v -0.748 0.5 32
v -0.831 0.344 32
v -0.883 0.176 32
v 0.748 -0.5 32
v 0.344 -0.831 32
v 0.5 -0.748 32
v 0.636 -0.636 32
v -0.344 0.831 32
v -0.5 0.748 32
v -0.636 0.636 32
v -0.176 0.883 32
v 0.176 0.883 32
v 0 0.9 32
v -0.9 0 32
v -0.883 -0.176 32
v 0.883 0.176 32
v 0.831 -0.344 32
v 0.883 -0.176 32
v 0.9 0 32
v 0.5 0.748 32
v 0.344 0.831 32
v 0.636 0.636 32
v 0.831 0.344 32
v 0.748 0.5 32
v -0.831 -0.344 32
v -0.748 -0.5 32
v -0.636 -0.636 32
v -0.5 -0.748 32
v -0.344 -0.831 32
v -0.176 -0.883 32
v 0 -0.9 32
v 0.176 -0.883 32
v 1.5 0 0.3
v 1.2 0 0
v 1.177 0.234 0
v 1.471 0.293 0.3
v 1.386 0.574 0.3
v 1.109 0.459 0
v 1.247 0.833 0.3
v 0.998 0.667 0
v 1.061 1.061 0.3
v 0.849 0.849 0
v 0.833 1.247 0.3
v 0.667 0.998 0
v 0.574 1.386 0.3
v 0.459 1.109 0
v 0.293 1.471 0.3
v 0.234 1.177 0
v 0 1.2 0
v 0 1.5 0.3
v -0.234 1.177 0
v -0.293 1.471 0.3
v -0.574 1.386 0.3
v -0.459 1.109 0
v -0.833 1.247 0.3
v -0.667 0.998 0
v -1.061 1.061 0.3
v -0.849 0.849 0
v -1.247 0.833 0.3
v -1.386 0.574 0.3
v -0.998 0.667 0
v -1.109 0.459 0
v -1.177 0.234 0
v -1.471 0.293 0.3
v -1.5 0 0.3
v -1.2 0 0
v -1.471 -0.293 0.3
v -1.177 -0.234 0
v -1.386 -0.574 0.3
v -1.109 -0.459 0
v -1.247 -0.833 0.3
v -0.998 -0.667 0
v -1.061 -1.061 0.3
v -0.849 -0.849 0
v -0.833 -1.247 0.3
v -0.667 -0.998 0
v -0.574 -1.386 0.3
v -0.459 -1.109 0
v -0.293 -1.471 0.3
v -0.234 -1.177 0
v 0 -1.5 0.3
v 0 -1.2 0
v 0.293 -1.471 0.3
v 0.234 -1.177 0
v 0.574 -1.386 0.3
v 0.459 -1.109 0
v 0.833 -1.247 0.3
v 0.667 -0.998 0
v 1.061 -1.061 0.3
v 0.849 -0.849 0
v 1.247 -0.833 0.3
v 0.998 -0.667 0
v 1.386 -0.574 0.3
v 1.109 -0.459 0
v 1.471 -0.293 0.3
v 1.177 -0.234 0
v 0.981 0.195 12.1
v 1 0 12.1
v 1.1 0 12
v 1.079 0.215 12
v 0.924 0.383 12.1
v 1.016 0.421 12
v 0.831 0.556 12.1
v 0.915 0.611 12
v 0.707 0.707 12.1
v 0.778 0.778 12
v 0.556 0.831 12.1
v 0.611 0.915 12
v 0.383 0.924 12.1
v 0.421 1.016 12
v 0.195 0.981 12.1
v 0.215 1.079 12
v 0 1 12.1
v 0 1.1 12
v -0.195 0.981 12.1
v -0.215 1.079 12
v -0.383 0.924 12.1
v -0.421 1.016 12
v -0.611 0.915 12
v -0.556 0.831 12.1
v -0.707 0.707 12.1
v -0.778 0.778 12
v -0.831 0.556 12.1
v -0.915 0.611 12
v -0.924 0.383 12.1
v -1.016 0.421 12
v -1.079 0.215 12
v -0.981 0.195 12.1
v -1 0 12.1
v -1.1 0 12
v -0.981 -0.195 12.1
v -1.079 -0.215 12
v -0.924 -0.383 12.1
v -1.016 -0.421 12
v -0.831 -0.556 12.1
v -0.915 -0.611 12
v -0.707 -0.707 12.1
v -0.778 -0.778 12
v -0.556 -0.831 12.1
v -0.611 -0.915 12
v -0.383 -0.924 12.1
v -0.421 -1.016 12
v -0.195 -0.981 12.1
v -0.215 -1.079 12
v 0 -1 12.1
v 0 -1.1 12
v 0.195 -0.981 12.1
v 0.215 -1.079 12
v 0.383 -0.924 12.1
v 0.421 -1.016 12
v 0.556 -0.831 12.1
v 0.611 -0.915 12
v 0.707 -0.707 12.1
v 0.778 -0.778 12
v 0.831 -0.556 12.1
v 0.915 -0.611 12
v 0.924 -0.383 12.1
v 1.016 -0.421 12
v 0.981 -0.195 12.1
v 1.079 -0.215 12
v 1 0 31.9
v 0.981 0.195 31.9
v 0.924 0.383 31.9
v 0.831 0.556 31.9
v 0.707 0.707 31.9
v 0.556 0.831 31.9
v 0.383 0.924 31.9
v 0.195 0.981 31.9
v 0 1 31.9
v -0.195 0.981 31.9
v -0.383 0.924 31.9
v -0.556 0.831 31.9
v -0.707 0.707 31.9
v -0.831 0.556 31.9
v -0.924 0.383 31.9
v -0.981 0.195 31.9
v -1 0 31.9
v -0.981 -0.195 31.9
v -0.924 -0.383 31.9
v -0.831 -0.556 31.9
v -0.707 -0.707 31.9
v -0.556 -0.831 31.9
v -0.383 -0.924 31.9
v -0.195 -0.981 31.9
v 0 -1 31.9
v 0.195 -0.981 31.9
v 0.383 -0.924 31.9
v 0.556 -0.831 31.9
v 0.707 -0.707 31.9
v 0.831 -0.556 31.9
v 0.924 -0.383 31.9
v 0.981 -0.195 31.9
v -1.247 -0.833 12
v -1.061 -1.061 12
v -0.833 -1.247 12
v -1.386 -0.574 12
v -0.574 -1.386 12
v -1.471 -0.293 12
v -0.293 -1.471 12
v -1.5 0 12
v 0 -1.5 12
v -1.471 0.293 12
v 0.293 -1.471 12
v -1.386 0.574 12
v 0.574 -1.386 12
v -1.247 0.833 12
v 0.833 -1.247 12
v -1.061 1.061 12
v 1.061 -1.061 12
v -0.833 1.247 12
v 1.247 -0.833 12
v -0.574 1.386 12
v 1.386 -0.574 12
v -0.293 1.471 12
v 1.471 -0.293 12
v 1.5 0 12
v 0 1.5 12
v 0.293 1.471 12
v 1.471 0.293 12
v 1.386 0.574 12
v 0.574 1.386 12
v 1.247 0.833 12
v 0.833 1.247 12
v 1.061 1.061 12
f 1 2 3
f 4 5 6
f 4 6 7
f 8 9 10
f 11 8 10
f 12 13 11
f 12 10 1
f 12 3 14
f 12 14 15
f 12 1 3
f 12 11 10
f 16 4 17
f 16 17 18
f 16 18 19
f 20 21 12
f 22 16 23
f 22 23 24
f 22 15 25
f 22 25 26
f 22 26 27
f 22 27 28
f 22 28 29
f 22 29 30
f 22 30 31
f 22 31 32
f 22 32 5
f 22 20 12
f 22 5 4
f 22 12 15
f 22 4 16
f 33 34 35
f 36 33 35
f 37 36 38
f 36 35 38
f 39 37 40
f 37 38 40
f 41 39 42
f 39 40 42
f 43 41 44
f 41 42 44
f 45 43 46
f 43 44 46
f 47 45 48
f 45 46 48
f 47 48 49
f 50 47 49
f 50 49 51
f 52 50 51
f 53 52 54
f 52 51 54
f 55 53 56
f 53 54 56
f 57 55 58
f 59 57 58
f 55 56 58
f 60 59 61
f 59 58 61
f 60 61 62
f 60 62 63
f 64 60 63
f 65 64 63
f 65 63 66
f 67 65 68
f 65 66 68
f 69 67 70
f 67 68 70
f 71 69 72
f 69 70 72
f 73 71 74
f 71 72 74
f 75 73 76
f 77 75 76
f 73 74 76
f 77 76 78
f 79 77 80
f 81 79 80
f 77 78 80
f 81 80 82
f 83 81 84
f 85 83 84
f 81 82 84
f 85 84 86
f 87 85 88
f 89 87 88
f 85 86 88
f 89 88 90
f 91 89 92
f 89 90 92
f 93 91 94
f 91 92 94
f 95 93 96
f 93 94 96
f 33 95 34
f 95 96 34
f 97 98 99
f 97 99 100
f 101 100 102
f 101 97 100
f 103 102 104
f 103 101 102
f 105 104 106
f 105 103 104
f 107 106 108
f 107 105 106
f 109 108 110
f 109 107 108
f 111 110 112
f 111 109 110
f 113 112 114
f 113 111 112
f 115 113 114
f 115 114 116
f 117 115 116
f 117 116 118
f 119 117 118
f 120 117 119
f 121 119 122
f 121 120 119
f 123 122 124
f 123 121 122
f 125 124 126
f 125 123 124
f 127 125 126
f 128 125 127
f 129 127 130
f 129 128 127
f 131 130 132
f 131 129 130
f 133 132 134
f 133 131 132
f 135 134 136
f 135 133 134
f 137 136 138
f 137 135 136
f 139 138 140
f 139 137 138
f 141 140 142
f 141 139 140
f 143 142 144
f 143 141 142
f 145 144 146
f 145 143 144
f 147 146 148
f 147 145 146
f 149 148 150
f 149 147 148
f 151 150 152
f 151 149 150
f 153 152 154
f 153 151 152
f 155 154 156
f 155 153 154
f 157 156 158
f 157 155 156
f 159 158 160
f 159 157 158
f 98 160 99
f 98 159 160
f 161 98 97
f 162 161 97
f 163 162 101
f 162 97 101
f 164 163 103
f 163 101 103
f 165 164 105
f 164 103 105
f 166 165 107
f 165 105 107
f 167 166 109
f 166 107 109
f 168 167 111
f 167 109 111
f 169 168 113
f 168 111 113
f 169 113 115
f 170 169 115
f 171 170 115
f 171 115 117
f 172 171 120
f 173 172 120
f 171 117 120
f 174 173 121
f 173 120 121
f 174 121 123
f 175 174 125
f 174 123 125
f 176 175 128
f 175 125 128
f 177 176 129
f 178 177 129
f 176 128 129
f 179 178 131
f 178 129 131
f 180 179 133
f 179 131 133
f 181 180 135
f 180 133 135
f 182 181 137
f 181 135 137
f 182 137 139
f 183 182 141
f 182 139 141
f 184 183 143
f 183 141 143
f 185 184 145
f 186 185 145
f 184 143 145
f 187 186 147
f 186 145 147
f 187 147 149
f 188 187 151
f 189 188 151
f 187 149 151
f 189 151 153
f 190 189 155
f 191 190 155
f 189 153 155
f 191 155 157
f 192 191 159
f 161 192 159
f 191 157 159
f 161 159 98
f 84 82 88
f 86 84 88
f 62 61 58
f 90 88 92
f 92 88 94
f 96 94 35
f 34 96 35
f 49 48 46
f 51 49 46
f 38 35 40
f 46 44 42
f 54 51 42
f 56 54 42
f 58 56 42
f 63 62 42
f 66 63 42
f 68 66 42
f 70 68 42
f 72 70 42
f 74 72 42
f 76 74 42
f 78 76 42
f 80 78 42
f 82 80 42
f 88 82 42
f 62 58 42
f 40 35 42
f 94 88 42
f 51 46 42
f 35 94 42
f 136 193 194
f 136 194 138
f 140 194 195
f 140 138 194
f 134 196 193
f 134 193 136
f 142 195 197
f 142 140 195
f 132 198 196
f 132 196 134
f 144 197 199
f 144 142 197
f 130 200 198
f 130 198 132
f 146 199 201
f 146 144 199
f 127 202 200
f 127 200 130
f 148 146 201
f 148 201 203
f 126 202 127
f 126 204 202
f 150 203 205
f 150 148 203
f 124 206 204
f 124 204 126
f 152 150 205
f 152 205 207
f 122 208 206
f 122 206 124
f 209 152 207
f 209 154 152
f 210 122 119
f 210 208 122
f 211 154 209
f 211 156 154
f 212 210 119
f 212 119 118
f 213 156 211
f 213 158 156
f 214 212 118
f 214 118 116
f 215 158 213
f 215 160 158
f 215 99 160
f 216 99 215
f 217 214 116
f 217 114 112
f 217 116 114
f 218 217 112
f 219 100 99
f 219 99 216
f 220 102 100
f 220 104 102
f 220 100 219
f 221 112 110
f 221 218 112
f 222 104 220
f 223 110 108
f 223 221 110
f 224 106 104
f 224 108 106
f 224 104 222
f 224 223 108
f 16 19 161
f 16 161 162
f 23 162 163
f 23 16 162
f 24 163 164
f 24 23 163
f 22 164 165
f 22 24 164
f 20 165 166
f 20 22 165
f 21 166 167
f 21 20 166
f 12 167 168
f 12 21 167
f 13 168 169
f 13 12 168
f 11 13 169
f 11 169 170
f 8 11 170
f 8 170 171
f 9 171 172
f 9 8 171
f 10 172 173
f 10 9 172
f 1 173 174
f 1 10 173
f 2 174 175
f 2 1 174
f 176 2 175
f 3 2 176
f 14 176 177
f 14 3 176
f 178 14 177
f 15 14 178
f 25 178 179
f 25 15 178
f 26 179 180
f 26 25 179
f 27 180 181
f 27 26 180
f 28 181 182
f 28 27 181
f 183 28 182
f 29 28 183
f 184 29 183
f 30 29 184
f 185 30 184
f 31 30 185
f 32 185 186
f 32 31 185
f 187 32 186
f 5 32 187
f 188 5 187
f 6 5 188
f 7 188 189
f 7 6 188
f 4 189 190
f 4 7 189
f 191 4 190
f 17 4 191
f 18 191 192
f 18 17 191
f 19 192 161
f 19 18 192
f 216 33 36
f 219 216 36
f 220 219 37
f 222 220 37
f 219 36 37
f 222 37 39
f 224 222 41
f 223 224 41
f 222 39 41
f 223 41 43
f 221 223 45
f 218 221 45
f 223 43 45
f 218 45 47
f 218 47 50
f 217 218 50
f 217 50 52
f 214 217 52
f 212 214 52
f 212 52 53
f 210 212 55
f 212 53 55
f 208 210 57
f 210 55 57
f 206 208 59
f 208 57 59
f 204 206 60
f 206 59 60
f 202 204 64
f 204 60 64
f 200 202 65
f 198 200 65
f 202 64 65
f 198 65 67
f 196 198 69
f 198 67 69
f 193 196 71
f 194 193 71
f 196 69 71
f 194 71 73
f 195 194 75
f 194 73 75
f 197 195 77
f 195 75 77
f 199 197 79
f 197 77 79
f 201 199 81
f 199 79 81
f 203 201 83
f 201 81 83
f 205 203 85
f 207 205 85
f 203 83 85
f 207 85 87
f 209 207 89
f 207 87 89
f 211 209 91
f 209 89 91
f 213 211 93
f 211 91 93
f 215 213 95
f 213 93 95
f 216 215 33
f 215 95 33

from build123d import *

# Parameters (mm, degrees)
SKETCH1_R           = 1.5
BOSS_EXTRUDE1_DEPTH = 12
SKETCH2_R           = 1
BOSS_EXTRUDE2_DEPTH = 20
CHAMFER1_SIZE       = 0.3
CHAMFER2_SIZE       = 0.1


with BuildPart() as part:
    # Sketch1 → Boss-Extrude1 (new body)
    with BuildSketch(Plane.XY):
        Circle(SKETCH1_R)
    extrude(amount=BOSS_EXTRUDE1_DEPTH)

    # Sketch2 → Boss-Extrude2 (add)
    with BuildSketch(Plane.XY.offset(12)):
        Circle(SKETCH2_R)
    extrude(amount=BOSS_EXTRUDE2_DEPTH)

    # Chamfer1
    chamfer1_edges = [part.edges().sort_by_distance(p)[0] for p in [
        (-1.5, 0, 0),
    ]]
    chamfer(chamfer1_edges, length=CHAMFER1_SIZE)

    # Chamfer2
    chamfer2_edges = [part.edges().sort_by_distance(p)[0] for p in [
        (-1, 0, 12),
        (-1, 0, 32),
    ]]
    chamfer(chamfer2_edges, length=CHAMFER2_SIZE)


solid = part.part
